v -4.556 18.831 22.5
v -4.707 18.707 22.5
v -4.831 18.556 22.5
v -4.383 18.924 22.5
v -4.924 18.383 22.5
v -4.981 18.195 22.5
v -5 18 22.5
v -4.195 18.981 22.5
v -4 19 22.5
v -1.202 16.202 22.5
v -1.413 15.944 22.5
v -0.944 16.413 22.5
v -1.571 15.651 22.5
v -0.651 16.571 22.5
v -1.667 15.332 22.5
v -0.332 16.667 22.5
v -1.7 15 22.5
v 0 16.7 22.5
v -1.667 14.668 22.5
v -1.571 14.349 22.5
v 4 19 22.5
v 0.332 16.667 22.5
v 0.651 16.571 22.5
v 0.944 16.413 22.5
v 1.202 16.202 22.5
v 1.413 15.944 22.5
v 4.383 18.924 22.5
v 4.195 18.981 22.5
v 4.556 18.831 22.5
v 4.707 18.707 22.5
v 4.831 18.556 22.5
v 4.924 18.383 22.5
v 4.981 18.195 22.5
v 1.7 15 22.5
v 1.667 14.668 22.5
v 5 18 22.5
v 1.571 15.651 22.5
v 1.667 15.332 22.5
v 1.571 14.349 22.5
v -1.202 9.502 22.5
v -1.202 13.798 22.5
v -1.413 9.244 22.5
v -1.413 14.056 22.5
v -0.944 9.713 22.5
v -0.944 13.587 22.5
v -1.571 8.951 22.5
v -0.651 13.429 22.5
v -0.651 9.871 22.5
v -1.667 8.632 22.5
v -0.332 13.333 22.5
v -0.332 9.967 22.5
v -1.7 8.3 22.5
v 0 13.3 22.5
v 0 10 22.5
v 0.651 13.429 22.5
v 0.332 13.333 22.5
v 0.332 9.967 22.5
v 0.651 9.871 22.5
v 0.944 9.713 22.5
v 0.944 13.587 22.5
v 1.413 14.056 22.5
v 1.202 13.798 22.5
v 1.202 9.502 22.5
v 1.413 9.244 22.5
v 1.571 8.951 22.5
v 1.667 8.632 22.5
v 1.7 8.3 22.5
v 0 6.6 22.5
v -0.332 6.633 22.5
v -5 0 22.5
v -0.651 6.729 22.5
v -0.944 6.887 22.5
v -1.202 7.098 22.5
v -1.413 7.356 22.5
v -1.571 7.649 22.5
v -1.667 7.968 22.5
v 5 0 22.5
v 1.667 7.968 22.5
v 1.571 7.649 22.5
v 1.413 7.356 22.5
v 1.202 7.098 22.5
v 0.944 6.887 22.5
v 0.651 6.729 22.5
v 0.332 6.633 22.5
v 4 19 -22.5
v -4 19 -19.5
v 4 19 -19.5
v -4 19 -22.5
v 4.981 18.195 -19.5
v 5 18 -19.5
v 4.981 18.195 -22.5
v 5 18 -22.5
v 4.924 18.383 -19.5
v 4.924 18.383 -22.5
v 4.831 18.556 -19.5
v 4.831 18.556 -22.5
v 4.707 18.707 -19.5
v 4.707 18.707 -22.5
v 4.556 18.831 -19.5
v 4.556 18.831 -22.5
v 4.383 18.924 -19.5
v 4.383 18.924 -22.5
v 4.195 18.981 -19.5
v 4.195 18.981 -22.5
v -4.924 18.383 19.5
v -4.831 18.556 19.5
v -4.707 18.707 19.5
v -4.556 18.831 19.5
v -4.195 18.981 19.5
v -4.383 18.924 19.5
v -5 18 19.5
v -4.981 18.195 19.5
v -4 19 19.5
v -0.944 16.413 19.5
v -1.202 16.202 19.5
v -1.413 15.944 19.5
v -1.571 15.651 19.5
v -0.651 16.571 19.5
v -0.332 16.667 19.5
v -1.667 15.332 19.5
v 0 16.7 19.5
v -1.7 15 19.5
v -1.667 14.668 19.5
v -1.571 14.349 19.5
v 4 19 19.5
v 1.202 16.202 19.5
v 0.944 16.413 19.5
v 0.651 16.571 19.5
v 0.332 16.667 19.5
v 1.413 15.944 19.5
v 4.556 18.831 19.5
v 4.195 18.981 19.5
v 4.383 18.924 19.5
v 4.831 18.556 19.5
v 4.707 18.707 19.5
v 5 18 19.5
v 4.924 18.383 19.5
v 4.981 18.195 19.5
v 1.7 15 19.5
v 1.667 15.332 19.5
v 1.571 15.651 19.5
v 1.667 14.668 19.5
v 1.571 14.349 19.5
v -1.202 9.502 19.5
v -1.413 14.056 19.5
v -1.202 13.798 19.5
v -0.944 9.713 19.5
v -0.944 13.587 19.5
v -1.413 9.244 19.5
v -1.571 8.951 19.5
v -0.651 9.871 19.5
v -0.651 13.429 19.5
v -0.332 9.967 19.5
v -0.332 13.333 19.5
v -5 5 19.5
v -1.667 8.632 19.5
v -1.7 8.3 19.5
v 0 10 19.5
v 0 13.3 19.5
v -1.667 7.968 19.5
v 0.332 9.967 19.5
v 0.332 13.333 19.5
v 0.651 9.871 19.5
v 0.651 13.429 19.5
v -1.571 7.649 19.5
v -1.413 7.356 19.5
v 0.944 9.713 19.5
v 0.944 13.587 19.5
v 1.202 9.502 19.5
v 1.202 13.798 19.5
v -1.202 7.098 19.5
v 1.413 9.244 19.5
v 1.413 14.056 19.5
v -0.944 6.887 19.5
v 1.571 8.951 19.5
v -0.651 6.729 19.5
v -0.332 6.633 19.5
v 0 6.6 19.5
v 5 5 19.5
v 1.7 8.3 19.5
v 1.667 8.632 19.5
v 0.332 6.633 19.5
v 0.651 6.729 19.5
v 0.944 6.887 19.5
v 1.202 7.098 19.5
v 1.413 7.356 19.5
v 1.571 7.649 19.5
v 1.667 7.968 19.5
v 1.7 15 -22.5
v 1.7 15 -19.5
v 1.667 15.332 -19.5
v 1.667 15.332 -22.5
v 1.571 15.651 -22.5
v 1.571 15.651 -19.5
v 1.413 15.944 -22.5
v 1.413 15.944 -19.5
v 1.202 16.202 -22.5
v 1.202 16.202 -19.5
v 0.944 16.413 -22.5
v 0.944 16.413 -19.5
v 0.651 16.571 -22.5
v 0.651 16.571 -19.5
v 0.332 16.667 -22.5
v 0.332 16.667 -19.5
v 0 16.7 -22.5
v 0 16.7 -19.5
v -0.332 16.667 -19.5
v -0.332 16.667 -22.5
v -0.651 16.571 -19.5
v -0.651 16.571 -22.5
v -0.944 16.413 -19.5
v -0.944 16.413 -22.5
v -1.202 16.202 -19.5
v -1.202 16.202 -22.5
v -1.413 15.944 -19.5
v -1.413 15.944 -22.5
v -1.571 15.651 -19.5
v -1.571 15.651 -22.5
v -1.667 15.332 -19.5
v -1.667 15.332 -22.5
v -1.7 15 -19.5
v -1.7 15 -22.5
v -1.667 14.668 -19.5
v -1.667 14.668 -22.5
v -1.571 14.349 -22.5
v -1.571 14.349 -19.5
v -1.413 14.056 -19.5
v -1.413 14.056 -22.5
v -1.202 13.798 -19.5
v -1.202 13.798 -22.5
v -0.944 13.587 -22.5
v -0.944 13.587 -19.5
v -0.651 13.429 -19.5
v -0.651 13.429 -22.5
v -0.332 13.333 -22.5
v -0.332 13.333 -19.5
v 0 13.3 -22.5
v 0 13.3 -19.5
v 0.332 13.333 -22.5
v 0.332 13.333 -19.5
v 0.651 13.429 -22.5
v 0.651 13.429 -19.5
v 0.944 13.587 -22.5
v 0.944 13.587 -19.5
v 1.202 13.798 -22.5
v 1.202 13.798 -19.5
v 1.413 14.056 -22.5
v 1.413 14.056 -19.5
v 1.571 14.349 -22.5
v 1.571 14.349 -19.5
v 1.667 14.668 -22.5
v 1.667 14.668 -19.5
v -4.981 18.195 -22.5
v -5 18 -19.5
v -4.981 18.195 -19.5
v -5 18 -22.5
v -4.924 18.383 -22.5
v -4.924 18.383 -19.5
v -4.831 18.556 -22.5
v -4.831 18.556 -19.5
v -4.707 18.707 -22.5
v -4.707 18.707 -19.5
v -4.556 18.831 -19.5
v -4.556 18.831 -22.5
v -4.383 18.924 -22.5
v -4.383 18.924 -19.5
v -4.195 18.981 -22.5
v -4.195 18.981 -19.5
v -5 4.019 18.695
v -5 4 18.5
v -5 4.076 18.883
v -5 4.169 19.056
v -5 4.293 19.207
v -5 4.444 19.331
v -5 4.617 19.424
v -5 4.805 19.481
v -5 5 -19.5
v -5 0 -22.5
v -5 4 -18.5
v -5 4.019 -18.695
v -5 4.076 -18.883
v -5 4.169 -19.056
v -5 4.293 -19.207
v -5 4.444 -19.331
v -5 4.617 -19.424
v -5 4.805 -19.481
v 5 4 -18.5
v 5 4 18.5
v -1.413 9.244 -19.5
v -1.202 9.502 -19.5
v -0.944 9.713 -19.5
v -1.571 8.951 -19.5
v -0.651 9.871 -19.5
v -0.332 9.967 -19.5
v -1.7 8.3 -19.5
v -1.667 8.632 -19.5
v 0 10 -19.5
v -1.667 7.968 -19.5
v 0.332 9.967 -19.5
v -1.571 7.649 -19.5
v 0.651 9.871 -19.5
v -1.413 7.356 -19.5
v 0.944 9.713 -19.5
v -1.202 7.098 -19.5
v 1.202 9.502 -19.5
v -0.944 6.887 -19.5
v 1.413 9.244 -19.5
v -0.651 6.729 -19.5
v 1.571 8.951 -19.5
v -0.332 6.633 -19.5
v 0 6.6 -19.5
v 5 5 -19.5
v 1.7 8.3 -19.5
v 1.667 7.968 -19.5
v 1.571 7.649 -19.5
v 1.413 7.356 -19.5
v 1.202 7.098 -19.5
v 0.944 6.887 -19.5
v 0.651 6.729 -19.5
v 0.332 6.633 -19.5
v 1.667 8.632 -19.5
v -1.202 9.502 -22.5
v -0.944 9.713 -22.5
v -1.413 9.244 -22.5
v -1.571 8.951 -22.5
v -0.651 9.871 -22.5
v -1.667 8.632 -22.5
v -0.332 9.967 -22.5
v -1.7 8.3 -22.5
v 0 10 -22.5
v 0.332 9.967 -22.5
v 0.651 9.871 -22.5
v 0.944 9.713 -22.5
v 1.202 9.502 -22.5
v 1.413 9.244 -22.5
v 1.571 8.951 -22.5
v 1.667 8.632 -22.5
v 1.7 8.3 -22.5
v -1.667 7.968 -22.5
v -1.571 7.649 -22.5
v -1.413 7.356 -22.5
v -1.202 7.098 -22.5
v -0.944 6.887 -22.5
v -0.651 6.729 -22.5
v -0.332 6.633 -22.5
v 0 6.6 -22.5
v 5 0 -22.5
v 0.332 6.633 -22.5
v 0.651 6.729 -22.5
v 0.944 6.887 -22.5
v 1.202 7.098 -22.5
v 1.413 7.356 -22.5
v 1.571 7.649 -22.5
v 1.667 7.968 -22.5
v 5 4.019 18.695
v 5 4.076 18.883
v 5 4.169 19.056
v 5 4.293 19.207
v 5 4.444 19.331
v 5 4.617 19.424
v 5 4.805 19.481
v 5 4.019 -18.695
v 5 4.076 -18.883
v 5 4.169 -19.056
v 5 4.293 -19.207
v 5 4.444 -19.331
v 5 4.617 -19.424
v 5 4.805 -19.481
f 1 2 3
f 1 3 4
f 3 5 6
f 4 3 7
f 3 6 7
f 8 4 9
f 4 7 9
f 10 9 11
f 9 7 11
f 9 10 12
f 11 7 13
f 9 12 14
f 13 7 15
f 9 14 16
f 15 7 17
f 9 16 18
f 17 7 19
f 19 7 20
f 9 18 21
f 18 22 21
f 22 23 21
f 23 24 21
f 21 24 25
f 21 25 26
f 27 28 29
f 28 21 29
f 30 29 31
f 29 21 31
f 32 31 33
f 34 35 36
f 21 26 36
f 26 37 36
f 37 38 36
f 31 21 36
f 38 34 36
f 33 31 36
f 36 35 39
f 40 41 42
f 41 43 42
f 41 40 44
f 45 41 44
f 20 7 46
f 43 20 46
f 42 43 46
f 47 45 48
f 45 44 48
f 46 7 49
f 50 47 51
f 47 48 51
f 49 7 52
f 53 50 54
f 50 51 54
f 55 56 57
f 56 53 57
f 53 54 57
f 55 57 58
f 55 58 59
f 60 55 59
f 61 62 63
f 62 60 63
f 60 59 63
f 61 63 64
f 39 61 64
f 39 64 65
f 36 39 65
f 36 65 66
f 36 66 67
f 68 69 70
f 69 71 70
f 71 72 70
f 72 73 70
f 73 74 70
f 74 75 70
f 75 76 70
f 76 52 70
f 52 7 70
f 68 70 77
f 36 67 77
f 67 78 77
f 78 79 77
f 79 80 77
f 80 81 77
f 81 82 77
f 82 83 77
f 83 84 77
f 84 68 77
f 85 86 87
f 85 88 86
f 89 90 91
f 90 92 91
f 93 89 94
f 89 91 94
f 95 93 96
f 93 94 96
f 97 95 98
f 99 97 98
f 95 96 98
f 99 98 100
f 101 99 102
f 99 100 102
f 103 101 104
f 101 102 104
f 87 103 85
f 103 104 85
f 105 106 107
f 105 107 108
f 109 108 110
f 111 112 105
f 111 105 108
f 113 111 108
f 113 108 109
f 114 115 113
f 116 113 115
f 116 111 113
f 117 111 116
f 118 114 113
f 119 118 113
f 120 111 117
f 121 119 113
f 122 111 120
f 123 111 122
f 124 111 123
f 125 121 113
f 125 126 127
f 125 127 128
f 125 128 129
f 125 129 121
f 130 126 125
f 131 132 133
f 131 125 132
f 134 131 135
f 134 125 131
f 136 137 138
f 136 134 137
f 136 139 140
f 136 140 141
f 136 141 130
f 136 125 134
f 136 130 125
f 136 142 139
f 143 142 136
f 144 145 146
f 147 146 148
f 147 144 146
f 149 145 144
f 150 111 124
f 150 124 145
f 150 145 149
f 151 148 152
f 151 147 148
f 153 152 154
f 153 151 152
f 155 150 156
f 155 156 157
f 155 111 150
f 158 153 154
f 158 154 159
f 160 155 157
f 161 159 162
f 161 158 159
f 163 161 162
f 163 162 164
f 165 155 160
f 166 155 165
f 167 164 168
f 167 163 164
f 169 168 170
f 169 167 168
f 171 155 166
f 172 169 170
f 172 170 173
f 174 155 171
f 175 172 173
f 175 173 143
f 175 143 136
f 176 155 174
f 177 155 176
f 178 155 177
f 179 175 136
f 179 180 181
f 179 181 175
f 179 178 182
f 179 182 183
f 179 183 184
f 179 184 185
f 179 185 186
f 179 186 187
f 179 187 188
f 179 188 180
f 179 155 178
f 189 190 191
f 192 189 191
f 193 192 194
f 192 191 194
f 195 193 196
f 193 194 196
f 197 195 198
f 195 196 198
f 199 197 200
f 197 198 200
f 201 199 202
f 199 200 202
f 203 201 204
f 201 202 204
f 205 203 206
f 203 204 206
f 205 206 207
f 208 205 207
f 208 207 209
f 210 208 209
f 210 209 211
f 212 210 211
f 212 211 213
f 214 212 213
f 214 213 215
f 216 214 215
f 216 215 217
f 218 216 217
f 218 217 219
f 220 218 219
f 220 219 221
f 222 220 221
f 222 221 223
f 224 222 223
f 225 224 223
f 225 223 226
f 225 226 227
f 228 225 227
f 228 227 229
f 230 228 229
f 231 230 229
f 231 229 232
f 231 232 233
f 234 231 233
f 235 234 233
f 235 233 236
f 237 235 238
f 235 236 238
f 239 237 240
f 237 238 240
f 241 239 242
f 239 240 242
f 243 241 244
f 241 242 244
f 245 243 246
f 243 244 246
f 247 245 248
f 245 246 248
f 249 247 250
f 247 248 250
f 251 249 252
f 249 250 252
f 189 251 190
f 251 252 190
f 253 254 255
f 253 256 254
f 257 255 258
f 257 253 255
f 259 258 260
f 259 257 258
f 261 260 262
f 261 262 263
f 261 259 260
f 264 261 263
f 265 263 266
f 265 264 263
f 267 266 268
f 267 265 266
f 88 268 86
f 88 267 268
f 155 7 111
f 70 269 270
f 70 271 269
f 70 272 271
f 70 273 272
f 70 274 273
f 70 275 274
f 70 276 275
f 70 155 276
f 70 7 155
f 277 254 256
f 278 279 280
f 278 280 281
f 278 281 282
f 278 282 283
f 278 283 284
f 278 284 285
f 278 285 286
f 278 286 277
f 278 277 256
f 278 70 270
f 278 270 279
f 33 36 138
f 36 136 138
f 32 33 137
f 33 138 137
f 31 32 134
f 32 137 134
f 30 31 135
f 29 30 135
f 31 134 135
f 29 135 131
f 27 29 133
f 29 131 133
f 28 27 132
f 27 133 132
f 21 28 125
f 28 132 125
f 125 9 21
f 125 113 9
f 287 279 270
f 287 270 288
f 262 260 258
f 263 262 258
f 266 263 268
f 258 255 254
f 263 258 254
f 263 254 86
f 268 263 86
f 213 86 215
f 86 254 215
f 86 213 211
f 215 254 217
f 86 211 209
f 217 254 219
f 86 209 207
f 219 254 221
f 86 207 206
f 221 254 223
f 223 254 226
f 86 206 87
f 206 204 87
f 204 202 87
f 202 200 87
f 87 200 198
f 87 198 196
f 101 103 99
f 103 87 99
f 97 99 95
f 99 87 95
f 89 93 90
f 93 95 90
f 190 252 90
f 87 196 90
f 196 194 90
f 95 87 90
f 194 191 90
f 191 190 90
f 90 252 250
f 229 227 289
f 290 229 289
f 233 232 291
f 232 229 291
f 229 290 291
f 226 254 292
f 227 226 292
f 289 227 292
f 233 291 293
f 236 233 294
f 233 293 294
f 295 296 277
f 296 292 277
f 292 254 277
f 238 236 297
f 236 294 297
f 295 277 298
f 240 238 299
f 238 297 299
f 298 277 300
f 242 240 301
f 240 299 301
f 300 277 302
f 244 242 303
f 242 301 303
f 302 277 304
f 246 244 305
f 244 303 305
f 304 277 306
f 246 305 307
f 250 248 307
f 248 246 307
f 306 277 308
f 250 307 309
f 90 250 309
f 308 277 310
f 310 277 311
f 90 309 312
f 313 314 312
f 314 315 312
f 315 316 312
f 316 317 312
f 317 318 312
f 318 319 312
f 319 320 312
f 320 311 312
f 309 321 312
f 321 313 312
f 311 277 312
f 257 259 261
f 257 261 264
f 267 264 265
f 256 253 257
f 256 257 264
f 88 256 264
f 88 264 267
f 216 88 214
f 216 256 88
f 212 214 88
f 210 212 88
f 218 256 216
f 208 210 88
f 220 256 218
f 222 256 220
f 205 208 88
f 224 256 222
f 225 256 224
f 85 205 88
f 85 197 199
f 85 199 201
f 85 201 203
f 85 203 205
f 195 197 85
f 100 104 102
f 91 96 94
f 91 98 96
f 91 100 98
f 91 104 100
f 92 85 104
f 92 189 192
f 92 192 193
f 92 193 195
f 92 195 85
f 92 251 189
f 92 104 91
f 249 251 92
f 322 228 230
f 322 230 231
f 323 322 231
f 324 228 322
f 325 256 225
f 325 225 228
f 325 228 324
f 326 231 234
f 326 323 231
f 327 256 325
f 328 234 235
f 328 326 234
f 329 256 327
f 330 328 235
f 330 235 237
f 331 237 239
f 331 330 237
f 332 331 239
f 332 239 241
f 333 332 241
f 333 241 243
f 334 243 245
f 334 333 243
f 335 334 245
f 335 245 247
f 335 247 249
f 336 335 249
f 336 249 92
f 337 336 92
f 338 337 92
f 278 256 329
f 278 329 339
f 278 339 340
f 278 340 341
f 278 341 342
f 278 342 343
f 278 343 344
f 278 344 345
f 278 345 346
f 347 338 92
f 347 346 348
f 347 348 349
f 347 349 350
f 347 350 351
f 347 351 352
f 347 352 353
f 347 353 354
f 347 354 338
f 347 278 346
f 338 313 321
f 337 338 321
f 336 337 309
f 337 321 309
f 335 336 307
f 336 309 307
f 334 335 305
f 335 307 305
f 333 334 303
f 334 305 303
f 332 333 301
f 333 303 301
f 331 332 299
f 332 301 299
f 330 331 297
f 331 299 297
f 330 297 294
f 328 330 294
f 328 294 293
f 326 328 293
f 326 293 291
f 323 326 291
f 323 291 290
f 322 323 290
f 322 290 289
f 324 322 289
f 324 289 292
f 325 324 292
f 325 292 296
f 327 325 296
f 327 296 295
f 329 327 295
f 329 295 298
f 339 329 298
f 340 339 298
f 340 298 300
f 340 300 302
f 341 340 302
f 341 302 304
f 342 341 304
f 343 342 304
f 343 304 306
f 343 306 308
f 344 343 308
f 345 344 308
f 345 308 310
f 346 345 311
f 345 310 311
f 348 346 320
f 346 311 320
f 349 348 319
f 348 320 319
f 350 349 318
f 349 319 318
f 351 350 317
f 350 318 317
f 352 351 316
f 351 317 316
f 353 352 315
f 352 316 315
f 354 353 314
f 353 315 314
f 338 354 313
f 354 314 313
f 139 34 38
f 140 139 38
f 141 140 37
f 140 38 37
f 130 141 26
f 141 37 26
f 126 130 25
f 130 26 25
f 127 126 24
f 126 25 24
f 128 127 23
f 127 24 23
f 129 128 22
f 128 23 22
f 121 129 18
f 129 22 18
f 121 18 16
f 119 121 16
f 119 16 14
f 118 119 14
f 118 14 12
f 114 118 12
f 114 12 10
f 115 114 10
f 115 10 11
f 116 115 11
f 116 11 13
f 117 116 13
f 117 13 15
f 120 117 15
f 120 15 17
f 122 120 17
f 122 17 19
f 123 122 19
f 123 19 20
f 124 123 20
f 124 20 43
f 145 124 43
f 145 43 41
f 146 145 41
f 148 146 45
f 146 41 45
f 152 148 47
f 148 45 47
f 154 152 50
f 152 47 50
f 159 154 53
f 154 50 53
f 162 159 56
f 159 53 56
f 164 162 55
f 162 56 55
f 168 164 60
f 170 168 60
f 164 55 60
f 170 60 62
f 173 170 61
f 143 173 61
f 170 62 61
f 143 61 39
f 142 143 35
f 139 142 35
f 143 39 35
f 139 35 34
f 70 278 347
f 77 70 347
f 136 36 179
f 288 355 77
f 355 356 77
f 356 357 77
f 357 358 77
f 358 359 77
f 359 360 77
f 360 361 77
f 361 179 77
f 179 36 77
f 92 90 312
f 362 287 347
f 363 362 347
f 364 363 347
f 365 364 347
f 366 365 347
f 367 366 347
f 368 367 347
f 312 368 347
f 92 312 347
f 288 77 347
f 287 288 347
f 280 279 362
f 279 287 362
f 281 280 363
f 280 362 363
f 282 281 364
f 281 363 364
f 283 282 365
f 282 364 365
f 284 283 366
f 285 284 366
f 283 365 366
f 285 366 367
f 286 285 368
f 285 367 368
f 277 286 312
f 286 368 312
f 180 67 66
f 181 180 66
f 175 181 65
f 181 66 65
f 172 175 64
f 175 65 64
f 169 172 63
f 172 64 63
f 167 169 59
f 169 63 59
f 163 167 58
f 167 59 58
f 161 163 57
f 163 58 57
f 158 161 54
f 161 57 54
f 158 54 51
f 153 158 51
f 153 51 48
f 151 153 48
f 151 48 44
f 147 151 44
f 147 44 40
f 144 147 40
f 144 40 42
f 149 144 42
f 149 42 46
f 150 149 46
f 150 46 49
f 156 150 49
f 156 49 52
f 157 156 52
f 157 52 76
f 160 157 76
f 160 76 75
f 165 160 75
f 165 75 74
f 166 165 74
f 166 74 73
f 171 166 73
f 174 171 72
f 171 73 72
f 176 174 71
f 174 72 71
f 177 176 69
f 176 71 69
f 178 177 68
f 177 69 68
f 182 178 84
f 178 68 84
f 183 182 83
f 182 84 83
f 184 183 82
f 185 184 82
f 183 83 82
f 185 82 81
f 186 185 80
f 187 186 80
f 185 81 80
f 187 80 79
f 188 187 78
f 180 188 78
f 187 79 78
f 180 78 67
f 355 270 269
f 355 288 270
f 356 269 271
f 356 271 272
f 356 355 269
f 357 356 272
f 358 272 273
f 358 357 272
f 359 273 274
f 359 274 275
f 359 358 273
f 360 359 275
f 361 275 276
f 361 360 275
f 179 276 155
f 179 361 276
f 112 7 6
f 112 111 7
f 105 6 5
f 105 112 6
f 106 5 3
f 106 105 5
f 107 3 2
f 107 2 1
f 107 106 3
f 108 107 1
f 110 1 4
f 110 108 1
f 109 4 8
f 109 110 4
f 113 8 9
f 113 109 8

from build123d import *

# Parameters (mm, degrees)
SKETCH2_W                      = 10
SKETCH2_H                      = 45
BOSS_EXTRUDE1_DEPTH            = 4
SKETCH3_W                      = 10
SKETCH3_H                      = 3
BOSS_EXTRUDE2_DEPTH            = 15
M3_CLEARANCE_HOLE1_D           = 3.4
M3_CLEARANCE_HOLE1_ON_FACE_2_D = 3.4
FILLET1_R                      = 1


with BuildPart() as part:
    # Sketch2 → Boss-Extrude1 (new body)
    with BuildSketch(Plane(origin=(0, 0, 0), x_dir=(1, 0, 0), z_dir=(0, 1, 0))):
        Rectangle(SKETCH2_W, SKETCH2_H)
    extrude(amount=BOSS_EXTRUDE1_DEPTH)

    # Sketch3 → Boss-Extrude2 (add)
    with BuildSketch(Plane(origin=(0, 4, 0), x_dir=(1, 0, 0), z_dir=(0, 1, 0))):
        with Locations((0, 21)):
            Rectangle(SKETCH3_W, SKETCH3_H)
        with Locations((0, -21)):
            Rectangle(SKETCH3_W, SKETCH3_H)
    extrude(amount=BOSS_EXTRUDE2_DEPTH)

    # M3 Clearance Hole1 (through all)
    with Locations(Plane(origin=(0, 15, -22.5), x_dir=(-1, 0, 0), z_dir=(0, 0, -1))):
        with Locations((0, 0), (0, -6.7)):
            Hole(M3_CLEARANCE_HOLE1_D / 2)

    # M3 Clearance Hole1 on face 2 (through all)
    with Locations(Plane(origin=(0, 15, 22.5), x_dir=(1, 0, 0), z_dir=(0, 0, 1))):
        with Locations((0, 0), (0, -6.7)):
            Hole(M3_CLEARANCE_HOLE1_ON_FACE_2_D / 2)

    # Fillet1
    fillet1_edges = [part.edges().sort_by_distance(p)[0] for p in [
        (0, 4, -19.5),
        (-5, 19, -21),
        (5, 19, -21),
        (0, 4, 19.5),
        (5, 19, 21),
        (-5, 19, 21),
    ]]
    fillet(fillet1_edges, radius=FILLET1_R)


solid = part.part
